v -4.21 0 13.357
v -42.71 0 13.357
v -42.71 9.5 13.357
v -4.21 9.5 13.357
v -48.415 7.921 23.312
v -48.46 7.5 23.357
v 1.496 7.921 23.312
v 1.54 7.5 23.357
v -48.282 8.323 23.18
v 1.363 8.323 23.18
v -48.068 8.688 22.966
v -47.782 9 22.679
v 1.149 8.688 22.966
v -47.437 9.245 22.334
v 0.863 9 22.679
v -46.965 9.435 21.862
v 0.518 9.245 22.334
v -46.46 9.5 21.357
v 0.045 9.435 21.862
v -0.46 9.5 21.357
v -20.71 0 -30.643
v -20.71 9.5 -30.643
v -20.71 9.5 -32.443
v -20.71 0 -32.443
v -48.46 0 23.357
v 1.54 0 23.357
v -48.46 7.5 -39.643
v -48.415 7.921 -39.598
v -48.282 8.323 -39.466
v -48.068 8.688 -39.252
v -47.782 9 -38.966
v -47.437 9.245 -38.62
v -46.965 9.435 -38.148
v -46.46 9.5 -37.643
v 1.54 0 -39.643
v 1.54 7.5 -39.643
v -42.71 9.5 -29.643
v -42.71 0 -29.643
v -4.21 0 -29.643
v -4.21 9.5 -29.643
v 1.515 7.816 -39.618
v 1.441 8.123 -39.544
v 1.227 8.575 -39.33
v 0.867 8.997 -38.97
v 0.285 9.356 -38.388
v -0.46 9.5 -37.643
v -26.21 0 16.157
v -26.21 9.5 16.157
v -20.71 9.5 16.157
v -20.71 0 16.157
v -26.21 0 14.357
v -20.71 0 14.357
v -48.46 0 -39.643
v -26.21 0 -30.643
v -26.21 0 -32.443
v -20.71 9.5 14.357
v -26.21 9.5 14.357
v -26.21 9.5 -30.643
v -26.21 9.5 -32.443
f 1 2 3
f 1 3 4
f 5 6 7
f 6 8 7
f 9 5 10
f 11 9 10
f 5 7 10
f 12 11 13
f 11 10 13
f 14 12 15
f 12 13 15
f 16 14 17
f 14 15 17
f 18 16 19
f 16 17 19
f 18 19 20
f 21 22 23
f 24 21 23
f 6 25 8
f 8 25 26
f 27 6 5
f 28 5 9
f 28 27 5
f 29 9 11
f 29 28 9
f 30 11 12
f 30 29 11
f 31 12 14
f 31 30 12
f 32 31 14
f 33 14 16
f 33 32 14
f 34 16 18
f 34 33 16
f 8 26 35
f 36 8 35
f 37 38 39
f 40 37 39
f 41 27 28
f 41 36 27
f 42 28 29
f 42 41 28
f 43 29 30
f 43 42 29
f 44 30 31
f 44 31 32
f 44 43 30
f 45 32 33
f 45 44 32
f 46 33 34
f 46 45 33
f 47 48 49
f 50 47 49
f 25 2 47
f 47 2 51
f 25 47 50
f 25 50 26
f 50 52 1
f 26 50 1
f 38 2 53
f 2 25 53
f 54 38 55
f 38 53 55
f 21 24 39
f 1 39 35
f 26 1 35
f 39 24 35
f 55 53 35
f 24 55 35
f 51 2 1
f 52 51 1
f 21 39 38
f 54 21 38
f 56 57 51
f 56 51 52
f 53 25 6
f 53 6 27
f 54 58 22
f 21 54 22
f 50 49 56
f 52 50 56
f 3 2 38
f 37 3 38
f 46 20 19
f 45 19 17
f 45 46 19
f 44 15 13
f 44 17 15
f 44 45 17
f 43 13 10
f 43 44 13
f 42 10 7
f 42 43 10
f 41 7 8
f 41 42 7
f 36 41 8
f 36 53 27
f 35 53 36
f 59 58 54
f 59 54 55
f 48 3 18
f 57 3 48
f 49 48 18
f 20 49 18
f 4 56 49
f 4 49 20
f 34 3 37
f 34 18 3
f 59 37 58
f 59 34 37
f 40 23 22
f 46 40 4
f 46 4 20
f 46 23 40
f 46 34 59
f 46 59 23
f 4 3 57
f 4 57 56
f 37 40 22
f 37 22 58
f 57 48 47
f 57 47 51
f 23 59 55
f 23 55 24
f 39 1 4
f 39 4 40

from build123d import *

# Parameters (mm, degrees)
SKETCH1_W           = 50
SKETCH1_H           = 63
SKETCH1_W_2         = 38.5
SKETCH1_H_2         = 43
BOSS_EXTRUDE1_DEPTH = 9.5
SKETCH2_W           = 5.5
SKETCH2_H           = 1.8
CUT_EXTRUDE1_DEPTH  = 64.325897498
FILLET1_R           = 2


with BuildPart() as part:
    # Sketch1 → Boss-Extrude1 (new body)
    with BuildSketch(Plane(origin=(0, 0, 0), x_dir=(1, 0, 0), z_dir=(0, 1, 0))):
        with Locations((-23.459677419, 8.143145161)):
            Rectangle(SKETCH1_W, SKETCH1_H)
        with Locations((-23.459677419, 8.143145161)):
            Rectangle(SKETCH1_W_2, SKETCH1_H_2, mode=Mode.SUBTRACT)
    extrude(amount=BOSS_EXTRUDE1_DEPTH)

    # Sketch2 → Cut-Extrude1 (cut, through all)
    with BuildSketch(Plane(origin=(0, 9.5, 0), x_dir=(1, 0, 0), z_dir=(0, 1, 0))):
        with Locations((-23.459677419, 31.543145161)):
            Rectangle(SKETCH2_W, SKETCH2_H)
        with Locations((-23.459677419, -15.256854839)):
            Rectangle(SKETCH2_W, SKETCH2_H)
    extrude(amount=-CUT_EXTRUDE1_DEPTH, mode=Mode.SUBTRACT)

    # Fillet1
    fillet1_edges = [part.edges().sort_by_distance(p)[0] for p in [
        (-48.459677419, 9.5, -8.143145161),
        (-23.459677419, 9.5, 23.356854839),
        (1.540322581, 9.5, -8.143145161),
        (-23.459677419, 9.5, -39.643145161),
    ]]
    fillet(fillet1_edges, radius=FILLET1_R)


solid = part.part
